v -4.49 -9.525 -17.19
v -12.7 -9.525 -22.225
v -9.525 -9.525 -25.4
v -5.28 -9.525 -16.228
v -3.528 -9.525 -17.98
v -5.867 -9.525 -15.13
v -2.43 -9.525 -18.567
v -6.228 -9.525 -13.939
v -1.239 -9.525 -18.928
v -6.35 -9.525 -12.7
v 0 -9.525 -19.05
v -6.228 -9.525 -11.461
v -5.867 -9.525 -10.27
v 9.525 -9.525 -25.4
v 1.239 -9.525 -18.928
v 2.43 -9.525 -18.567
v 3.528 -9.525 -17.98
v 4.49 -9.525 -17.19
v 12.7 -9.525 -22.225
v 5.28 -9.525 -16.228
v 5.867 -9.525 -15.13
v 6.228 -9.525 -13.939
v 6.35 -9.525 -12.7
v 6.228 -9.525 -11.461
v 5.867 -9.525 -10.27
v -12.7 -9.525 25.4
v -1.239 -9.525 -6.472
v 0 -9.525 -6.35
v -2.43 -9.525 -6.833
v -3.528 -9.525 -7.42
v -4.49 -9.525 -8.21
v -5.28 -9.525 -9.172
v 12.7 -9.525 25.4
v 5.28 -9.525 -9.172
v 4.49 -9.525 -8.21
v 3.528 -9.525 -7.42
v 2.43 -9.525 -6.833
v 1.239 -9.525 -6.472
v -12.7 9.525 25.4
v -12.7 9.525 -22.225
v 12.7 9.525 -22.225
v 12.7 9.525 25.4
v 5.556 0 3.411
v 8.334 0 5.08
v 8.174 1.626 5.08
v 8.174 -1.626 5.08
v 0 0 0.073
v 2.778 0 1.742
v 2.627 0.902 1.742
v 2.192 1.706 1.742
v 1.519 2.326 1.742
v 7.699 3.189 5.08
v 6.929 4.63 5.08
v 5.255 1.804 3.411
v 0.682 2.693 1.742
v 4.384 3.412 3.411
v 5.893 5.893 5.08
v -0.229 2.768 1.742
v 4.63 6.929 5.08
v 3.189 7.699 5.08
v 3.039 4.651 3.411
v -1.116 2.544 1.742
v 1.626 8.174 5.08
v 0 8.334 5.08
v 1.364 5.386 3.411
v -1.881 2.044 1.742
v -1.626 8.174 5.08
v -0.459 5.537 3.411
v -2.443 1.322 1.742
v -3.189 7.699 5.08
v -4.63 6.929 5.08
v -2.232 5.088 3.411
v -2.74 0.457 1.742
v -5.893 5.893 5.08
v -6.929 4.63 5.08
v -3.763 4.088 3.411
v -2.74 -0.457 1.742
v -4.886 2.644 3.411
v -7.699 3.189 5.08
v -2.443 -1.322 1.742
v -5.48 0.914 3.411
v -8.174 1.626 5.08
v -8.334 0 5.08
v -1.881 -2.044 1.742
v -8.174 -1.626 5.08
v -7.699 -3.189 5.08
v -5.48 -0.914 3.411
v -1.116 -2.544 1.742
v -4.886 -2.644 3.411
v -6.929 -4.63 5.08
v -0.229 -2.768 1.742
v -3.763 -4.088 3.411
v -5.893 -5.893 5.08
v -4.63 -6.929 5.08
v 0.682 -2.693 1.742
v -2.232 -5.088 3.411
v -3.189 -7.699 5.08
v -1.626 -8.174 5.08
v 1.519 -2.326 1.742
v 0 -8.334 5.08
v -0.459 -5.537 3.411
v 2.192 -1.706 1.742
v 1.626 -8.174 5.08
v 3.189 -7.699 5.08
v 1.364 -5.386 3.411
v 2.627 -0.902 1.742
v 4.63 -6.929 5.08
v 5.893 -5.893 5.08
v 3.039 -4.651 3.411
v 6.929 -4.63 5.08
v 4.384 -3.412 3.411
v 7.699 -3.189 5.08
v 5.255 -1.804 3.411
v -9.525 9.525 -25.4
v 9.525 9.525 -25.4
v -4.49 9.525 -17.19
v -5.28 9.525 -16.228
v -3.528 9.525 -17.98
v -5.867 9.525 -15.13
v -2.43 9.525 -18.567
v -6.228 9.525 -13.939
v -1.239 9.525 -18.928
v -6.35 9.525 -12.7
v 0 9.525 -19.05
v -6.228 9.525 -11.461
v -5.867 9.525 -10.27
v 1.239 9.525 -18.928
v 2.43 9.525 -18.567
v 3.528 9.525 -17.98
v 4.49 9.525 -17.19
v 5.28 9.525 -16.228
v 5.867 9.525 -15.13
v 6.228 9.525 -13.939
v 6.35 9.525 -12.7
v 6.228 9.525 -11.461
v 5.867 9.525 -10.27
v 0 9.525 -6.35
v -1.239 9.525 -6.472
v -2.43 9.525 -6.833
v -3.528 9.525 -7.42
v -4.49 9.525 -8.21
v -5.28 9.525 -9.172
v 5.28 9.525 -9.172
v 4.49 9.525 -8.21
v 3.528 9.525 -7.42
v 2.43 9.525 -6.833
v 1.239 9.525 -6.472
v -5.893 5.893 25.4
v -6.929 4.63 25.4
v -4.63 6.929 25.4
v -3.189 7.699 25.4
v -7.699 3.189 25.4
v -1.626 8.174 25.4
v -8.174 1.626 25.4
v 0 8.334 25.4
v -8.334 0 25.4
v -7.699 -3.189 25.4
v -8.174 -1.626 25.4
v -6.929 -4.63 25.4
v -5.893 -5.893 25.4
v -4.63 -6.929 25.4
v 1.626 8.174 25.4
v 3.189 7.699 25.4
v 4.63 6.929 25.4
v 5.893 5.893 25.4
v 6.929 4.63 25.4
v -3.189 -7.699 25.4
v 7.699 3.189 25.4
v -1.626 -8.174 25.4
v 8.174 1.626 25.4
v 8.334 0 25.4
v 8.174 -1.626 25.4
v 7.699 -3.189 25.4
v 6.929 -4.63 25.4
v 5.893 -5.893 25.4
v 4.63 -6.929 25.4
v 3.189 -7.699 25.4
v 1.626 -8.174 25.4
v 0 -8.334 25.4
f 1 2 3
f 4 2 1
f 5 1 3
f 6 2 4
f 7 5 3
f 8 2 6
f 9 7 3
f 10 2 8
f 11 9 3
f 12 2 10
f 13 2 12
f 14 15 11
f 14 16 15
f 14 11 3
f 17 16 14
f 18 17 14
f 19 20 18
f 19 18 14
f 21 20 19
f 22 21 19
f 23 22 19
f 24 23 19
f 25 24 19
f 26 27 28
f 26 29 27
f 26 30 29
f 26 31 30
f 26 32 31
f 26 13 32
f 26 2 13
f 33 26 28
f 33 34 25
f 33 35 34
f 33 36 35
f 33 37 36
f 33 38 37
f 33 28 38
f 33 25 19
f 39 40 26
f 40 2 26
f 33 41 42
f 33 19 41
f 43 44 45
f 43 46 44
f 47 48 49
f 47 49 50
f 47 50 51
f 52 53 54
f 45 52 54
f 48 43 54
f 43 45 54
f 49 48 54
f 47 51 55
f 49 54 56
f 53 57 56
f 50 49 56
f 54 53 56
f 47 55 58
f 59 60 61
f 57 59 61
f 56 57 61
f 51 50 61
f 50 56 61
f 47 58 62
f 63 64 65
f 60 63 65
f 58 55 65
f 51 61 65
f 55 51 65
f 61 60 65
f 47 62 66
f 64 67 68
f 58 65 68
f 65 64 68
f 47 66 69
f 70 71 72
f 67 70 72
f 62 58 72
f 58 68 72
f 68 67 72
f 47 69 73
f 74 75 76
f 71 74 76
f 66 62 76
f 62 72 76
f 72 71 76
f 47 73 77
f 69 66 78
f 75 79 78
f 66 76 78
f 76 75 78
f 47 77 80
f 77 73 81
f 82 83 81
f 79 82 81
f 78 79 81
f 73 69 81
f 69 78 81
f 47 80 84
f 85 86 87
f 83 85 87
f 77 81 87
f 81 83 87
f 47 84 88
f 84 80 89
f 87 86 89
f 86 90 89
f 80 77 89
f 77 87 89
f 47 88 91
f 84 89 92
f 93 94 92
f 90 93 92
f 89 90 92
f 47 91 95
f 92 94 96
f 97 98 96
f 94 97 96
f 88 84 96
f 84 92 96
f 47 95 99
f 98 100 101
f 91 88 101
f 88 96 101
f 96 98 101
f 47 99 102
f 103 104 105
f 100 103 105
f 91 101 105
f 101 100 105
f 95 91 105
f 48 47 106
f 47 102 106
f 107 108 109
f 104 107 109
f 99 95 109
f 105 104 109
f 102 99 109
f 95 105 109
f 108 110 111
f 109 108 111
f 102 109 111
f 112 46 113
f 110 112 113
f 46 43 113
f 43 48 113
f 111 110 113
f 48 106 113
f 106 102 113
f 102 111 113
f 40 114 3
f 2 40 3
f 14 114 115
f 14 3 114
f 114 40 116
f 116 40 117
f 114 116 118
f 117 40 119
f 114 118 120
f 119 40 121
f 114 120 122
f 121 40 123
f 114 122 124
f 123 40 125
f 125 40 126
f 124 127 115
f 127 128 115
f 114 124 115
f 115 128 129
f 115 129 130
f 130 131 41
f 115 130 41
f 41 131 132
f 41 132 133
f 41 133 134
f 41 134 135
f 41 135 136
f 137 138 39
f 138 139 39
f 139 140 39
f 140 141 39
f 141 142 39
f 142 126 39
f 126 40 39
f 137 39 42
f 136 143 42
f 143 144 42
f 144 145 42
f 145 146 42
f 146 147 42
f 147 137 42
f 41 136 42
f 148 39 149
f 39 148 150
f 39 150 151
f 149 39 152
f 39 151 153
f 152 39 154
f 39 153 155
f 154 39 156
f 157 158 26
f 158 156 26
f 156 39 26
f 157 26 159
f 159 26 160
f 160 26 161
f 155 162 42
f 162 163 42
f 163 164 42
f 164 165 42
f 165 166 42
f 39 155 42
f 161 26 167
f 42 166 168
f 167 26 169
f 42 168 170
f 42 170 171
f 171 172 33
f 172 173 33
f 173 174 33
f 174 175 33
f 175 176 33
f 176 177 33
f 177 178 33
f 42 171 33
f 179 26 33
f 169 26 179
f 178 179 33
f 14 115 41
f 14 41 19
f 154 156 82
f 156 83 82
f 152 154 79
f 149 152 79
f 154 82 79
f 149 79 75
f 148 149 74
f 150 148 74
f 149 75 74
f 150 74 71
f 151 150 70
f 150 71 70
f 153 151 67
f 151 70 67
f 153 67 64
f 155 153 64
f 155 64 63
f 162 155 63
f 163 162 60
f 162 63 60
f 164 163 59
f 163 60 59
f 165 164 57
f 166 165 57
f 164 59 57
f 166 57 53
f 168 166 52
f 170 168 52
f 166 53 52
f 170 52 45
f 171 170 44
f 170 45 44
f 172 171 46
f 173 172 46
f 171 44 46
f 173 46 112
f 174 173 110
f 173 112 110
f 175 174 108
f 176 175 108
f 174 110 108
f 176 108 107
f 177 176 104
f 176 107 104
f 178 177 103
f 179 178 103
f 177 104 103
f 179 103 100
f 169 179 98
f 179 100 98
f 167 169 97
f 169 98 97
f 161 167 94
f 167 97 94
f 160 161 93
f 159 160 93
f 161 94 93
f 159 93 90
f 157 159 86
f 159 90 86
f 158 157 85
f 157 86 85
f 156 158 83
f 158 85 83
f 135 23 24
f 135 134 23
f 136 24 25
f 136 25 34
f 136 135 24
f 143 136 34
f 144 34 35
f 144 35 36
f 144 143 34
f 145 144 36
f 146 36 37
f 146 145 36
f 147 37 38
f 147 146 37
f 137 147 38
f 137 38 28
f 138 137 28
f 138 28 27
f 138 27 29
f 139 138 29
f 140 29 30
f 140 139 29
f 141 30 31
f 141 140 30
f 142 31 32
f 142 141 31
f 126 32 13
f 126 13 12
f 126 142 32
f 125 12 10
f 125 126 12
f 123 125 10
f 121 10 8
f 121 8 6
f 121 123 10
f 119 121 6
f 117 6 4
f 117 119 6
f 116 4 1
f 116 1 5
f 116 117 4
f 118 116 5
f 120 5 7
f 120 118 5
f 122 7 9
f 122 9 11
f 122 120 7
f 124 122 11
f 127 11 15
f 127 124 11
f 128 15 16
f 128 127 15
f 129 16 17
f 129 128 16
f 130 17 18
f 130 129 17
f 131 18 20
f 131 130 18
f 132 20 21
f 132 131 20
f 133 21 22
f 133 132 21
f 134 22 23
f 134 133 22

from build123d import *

# Parameters (mm, degrees)
F0_W     = 25.4
F0_H     = 50.8
F0_R     = 6.35
F1_DEPTH = 9.525
F2_SIZE  = 3.175
F4_D     = 16.66748
F4_DEPTH = 20.32
F4_TIP   = 5.0074161752


with BuildPart() as f1:
    # F0 (on Front) → F1 (new body, symmetric)
    with BuildSketch(Plane.XZ):
        Rectangle(F0_W, F0_H)
        with Locations((0, -12.7)):
            Circle(F0_R, mode=Mode.SUBTRACT)
    extrude(amount=F1_DEPTH, both=True)

    # F2
    f2_edges = [f1.edges().sort_by_distance(p)[0] for p in [
        (12.7, 0, -25.4),
        (-12.7, 0, -25.4),
    ]]
    chamfer(f2_edges, length=F2_SIZE)

    # F4
    with Locations(Plane.XY.offset(25.4)):
        with Locations((0, 0)):
            Hole(F4_D / 2, depth=F4_DEPTH)
            with Locations((0, 0, -(F4_DEPTH + F4_TIP / 2))):  # 118° drill point
                Cone(0, F4_D / 2, F4_TIP, mode=Mode.SUBTRACT)


solid = f1.part
